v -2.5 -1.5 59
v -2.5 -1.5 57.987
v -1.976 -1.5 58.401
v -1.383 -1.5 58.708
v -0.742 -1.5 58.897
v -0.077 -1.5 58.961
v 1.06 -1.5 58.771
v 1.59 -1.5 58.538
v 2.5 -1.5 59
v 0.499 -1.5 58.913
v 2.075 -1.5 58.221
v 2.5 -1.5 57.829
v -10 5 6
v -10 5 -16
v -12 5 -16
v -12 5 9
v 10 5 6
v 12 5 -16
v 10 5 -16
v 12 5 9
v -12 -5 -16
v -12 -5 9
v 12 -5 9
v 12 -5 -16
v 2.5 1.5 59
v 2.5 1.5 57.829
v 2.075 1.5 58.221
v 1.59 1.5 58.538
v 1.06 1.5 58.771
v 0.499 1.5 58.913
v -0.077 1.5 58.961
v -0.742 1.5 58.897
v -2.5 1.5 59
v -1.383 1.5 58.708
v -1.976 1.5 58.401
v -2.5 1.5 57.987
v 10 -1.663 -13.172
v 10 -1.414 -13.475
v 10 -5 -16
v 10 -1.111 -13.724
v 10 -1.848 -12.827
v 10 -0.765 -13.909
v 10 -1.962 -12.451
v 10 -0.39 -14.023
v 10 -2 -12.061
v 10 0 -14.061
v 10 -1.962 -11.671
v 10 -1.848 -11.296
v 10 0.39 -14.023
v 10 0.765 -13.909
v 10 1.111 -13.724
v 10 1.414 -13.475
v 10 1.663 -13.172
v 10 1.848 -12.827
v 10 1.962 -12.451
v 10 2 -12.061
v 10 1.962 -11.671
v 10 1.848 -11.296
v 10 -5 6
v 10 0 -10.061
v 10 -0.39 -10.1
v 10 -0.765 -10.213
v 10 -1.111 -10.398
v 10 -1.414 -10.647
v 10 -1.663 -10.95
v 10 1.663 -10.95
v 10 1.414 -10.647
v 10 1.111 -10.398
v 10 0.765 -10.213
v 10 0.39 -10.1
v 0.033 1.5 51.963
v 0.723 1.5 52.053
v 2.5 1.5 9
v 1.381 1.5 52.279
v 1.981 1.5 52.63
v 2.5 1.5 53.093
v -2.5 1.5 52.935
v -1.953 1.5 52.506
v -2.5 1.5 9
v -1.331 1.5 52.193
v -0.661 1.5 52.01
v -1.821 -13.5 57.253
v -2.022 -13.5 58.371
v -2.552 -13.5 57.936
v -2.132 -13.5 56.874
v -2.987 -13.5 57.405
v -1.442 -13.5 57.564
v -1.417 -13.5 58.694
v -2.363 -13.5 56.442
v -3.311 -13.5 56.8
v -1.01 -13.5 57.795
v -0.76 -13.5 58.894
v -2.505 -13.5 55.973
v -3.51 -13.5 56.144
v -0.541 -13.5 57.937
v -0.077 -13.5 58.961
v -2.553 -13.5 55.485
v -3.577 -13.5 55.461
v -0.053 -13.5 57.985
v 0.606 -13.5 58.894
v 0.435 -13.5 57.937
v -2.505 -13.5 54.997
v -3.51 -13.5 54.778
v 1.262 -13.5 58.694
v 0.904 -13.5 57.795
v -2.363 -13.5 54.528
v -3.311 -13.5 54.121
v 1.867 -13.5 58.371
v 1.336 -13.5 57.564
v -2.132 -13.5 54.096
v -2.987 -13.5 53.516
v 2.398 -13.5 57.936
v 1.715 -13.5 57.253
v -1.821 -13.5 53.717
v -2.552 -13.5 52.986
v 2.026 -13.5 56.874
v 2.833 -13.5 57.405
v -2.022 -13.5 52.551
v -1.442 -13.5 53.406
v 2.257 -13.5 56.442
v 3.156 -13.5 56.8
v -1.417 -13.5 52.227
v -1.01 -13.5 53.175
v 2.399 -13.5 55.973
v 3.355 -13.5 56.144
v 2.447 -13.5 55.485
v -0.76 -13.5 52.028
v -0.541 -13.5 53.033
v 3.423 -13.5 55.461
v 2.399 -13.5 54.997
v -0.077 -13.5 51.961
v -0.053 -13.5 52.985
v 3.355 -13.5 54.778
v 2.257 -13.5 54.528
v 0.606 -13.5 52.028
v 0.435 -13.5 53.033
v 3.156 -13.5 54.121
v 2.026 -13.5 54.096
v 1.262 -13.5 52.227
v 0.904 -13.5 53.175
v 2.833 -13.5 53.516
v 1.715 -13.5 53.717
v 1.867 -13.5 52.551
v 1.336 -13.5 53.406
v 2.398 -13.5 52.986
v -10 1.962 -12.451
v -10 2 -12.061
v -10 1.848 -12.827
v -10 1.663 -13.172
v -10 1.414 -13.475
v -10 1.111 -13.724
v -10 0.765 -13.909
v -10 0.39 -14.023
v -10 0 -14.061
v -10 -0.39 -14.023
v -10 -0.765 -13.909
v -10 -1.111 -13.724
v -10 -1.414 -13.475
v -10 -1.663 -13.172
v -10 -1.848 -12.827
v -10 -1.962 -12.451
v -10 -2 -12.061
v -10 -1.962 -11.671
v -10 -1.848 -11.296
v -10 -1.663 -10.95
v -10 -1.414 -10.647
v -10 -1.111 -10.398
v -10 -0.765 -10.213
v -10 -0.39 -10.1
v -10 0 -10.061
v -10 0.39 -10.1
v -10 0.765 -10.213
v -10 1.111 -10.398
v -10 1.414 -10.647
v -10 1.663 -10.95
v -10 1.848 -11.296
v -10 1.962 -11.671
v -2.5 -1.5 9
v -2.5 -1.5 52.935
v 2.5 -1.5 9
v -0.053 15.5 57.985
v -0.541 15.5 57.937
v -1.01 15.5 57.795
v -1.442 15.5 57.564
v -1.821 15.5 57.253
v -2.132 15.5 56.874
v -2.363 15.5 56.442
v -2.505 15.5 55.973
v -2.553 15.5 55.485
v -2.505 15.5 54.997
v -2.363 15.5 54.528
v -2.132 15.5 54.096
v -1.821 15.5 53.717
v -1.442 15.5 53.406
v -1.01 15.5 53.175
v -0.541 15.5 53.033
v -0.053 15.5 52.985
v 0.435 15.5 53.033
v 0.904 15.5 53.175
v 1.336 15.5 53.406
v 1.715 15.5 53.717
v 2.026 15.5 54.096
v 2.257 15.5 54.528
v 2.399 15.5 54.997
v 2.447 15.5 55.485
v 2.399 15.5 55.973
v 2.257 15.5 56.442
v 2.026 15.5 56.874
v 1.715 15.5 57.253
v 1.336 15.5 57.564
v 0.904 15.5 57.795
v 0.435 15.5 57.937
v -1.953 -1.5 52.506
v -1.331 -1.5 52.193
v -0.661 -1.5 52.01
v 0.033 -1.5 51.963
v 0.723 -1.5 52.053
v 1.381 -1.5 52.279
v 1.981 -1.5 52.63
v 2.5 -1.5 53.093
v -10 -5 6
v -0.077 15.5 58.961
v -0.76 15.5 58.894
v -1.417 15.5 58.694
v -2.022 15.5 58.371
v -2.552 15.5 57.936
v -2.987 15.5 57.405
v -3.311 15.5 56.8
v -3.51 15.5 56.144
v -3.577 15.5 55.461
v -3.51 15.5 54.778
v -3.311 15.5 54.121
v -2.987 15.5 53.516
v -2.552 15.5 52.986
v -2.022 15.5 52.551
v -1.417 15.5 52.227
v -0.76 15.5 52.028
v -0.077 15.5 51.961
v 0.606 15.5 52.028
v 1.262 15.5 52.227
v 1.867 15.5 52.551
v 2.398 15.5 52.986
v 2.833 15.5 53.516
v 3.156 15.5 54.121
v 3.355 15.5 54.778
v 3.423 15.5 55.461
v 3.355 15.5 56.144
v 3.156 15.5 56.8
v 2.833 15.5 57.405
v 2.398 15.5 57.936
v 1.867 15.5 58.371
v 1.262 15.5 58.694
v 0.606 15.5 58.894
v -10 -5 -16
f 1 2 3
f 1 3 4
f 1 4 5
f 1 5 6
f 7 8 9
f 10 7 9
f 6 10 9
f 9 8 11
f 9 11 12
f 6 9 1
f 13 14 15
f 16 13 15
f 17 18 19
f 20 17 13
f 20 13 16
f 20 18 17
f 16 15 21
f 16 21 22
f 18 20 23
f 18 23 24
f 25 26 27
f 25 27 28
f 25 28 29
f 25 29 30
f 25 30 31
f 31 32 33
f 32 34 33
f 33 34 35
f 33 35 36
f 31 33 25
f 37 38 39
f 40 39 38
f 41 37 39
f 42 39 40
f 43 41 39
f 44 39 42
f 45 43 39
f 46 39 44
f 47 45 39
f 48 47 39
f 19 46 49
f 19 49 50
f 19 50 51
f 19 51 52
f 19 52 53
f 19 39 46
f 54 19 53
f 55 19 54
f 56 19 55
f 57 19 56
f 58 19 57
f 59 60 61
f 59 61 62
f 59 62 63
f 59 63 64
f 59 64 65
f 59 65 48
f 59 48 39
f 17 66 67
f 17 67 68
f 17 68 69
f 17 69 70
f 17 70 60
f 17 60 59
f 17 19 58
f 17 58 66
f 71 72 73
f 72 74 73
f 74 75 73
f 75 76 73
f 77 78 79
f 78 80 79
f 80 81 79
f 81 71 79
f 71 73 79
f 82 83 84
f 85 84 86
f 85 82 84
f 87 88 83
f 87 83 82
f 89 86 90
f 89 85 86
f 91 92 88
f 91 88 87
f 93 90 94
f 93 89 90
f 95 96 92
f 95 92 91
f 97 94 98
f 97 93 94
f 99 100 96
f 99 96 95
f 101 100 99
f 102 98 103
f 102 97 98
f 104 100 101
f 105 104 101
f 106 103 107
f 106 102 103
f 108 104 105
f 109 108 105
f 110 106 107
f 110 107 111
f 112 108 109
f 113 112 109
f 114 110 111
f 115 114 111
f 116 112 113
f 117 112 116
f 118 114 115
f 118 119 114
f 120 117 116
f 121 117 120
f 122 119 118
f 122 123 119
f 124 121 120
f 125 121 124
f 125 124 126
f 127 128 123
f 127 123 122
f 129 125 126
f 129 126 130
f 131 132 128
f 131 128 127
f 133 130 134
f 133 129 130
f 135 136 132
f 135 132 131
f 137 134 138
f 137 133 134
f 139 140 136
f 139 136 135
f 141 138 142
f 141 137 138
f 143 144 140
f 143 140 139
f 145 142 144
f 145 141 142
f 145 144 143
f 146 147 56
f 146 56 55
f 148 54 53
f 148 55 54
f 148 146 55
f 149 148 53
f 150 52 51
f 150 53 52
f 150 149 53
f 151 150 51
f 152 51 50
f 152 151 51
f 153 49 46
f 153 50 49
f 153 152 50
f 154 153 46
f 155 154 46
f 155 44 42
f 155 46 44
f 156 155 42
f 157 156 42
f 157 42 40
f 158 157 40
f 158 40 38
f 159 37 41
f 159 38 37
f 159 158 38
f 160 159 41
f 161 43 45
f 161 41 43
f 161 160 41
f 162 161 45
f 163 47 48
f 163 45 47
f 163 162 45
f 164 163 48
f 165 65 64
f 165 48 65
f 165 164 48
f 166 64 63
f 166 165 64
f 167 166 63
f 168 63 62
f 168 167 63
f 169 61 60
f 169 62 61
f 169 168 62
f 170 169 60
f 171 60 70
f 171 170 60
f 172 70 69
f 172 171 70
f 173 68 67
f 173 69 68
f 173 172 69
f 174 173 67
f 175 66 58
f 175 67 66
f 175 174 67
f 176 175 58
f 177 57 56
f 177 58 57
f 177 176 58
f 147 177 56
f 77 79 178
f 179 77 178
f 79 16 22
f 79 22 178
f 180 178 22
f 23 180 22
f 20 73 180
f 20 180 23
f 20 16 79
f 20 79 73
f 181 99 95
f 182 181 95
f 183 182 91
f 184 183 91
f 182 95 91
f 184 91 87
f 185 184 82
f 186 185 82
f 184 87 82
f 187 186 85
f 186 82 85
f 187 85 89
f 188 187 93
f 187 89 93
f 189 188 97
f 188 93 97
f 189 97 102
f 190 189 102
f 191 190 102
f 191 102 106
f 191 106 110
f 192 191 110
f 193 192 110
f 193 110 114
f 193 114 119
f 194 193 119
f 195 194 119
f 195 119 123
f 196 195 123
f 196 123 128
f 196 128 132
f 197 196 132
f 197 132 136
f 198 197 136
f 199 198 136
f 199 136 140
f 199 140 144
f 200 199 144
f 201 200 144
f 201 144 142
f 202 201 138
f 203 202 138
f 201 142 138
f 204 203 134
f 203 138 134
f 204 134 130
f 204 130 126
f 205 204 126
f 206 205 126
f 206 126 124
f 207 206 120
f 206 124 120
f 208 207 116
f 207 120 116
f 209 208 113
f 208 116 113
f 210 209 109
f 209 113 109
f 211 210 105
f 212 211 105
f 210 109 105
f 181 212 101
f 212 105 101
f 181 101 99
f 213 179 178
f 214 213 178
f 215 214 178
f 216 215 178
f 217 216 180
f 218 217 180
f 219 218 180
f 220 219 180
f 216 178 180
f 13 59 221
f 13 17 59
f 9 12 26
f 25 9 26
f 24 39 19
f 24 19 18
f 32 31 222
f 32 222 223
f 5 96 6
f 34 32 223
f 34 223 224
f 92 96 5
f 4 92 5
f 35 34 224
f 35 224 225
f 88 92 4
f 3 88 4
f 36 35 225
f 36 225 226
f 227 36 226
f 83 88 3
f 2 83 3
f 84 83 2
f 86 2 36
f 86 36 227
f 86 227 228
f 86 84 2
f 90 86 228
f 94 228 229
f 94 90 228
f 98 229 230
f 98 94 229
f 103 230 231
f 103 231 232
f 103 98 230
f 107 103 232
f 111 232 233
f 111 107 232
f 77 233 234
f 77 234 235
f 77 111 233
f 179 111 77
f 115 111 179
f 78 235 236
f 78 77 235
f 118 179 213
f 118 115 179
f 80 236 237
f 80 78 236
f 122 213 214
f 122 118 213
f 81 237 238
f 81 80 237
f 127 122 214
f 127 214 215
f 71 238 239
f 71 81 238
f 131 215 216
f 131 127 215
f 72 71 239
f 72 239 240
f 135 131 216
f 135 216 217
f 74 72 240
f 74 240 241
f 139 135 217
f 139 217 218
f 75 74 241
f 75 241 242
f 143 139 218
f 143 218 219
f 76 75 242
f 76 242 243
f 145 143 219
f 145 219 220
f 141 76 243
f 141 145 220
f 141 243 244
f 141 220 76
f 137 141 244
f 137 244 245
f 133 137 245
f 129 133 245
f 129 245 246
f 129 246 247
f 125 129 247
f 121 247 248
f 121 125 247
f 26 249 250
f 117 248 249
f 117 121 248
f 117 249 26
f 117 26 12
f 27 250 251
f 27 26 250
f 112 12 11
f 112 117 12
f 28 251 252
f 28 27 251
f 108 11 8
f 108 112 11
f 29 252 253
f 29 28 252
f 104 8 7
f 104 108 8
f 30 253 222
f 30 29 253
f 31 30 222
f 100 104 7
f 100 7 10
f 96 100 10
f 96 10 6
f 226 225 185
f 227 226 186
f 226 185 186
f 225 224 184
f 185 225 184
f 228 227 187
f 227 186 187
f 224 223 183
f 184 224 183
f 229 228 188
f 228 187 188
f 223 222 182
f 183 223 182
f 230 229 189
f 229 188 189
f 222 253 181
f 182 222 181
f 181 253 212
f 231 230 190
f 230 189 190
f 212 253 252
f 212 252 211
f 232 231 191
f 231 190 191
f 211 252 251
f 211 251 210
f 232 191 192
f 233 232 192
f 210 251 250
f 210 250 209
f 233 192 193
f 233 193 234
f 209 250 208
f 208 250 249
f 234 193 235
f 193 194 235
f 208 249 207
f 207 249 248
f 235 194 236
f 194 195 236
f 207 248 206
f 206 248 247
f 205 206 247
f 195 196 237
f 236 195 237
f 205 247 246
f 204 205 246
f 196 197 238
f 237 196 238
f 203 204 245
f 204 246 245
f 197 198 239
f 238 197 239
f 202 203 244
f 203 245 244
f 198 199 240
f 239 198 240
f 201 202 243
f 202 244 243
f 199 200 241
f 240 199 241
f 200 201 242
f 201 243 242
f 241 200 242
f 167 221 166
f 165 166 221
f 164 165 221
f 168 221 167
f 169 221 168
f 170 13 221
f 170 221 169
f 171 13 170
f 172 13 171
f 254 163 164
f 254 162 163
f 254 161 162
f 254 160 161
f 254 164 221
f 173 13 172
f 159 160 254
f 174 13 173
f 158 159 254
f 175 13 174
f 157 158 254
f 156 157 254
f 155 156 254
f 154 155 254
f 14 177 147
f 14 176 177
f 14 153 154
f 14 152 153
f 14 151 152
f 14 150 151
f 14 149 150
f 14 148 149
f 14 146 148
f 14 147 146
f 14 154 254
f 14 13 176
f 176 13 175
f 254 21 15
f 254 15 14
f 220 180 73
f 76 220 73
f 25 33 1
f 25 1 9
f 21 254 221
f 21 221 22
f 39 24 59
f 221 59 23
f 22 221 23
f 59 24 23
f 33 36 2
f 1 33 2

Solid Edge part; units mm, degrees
sketch "Sketch1" plane through (0, 0, 0) normal (0, -1, 0) x (1, 0, 0)
  line L0 (-12, 9) -> (12, 9)
  line L1 (12, 9) -> (12, -16)
  line L2 (10, -16) -> (12, -16)
  line L3 (10, -16) -> (10, 6)
  line L4 (10, 6) -> (-10, 6)
  line L5 (-10, 6) -> (-10, -16)
  line L6 (-12, -16) -> (-10, -16)
  line L7 (-12, -16) -> (-12, 9)
extrude "Protrusion1" add sketch "Sketch1" along normal mid plane 10
sketch "Sketch2" plane through (-10, 0, -5) normal (1, 0, 0) x (0, 1, 0)
  circle A0 centre (0, -7.0612) radius 2
extrude "ExtrudedProtrusion_5" add sketch "Sketch2" along normal blind 20
sketch "Sketch3" plane through (0, 0, 9) normal (0, 0, 1) x (1, 0, 0)
  line L0 (2.5, -1.5) -> (2.5, 1.5)
  line L1 (2.5, 1.5) -> (-2.5, 1.5)
  line L2 (-2.5, 1.5) -> (-2.5, -1.5)
  line L3 (-2.5, -1.5) -> (2.5, -1.5)
extrude "ExtrudedProtrusion_6" add sketch "Sketch3" along normal blind 50
sketch "Sketch4" plane through (0, -1.5, 34) normal (0, -1, 0) x (0, 0, 1)
  circle A0 centre (21.4608, 0.0773) radius 3.5
extrude "ExtrudedProtrusion_9" add sketch "Sketch4" against normal blind 17 and the other way blind 12
sketch "Sketch5" plane through (-0.0773, -13.5, 55.4608) normal (0, -1, 0) x (0, 0, 1)
  circle A0 centre (0.0243, -0.0243) radius 2.5
extrude "ExtrudedCutout_2" cut sketch "Sketch5" against normal blind 47.3814
